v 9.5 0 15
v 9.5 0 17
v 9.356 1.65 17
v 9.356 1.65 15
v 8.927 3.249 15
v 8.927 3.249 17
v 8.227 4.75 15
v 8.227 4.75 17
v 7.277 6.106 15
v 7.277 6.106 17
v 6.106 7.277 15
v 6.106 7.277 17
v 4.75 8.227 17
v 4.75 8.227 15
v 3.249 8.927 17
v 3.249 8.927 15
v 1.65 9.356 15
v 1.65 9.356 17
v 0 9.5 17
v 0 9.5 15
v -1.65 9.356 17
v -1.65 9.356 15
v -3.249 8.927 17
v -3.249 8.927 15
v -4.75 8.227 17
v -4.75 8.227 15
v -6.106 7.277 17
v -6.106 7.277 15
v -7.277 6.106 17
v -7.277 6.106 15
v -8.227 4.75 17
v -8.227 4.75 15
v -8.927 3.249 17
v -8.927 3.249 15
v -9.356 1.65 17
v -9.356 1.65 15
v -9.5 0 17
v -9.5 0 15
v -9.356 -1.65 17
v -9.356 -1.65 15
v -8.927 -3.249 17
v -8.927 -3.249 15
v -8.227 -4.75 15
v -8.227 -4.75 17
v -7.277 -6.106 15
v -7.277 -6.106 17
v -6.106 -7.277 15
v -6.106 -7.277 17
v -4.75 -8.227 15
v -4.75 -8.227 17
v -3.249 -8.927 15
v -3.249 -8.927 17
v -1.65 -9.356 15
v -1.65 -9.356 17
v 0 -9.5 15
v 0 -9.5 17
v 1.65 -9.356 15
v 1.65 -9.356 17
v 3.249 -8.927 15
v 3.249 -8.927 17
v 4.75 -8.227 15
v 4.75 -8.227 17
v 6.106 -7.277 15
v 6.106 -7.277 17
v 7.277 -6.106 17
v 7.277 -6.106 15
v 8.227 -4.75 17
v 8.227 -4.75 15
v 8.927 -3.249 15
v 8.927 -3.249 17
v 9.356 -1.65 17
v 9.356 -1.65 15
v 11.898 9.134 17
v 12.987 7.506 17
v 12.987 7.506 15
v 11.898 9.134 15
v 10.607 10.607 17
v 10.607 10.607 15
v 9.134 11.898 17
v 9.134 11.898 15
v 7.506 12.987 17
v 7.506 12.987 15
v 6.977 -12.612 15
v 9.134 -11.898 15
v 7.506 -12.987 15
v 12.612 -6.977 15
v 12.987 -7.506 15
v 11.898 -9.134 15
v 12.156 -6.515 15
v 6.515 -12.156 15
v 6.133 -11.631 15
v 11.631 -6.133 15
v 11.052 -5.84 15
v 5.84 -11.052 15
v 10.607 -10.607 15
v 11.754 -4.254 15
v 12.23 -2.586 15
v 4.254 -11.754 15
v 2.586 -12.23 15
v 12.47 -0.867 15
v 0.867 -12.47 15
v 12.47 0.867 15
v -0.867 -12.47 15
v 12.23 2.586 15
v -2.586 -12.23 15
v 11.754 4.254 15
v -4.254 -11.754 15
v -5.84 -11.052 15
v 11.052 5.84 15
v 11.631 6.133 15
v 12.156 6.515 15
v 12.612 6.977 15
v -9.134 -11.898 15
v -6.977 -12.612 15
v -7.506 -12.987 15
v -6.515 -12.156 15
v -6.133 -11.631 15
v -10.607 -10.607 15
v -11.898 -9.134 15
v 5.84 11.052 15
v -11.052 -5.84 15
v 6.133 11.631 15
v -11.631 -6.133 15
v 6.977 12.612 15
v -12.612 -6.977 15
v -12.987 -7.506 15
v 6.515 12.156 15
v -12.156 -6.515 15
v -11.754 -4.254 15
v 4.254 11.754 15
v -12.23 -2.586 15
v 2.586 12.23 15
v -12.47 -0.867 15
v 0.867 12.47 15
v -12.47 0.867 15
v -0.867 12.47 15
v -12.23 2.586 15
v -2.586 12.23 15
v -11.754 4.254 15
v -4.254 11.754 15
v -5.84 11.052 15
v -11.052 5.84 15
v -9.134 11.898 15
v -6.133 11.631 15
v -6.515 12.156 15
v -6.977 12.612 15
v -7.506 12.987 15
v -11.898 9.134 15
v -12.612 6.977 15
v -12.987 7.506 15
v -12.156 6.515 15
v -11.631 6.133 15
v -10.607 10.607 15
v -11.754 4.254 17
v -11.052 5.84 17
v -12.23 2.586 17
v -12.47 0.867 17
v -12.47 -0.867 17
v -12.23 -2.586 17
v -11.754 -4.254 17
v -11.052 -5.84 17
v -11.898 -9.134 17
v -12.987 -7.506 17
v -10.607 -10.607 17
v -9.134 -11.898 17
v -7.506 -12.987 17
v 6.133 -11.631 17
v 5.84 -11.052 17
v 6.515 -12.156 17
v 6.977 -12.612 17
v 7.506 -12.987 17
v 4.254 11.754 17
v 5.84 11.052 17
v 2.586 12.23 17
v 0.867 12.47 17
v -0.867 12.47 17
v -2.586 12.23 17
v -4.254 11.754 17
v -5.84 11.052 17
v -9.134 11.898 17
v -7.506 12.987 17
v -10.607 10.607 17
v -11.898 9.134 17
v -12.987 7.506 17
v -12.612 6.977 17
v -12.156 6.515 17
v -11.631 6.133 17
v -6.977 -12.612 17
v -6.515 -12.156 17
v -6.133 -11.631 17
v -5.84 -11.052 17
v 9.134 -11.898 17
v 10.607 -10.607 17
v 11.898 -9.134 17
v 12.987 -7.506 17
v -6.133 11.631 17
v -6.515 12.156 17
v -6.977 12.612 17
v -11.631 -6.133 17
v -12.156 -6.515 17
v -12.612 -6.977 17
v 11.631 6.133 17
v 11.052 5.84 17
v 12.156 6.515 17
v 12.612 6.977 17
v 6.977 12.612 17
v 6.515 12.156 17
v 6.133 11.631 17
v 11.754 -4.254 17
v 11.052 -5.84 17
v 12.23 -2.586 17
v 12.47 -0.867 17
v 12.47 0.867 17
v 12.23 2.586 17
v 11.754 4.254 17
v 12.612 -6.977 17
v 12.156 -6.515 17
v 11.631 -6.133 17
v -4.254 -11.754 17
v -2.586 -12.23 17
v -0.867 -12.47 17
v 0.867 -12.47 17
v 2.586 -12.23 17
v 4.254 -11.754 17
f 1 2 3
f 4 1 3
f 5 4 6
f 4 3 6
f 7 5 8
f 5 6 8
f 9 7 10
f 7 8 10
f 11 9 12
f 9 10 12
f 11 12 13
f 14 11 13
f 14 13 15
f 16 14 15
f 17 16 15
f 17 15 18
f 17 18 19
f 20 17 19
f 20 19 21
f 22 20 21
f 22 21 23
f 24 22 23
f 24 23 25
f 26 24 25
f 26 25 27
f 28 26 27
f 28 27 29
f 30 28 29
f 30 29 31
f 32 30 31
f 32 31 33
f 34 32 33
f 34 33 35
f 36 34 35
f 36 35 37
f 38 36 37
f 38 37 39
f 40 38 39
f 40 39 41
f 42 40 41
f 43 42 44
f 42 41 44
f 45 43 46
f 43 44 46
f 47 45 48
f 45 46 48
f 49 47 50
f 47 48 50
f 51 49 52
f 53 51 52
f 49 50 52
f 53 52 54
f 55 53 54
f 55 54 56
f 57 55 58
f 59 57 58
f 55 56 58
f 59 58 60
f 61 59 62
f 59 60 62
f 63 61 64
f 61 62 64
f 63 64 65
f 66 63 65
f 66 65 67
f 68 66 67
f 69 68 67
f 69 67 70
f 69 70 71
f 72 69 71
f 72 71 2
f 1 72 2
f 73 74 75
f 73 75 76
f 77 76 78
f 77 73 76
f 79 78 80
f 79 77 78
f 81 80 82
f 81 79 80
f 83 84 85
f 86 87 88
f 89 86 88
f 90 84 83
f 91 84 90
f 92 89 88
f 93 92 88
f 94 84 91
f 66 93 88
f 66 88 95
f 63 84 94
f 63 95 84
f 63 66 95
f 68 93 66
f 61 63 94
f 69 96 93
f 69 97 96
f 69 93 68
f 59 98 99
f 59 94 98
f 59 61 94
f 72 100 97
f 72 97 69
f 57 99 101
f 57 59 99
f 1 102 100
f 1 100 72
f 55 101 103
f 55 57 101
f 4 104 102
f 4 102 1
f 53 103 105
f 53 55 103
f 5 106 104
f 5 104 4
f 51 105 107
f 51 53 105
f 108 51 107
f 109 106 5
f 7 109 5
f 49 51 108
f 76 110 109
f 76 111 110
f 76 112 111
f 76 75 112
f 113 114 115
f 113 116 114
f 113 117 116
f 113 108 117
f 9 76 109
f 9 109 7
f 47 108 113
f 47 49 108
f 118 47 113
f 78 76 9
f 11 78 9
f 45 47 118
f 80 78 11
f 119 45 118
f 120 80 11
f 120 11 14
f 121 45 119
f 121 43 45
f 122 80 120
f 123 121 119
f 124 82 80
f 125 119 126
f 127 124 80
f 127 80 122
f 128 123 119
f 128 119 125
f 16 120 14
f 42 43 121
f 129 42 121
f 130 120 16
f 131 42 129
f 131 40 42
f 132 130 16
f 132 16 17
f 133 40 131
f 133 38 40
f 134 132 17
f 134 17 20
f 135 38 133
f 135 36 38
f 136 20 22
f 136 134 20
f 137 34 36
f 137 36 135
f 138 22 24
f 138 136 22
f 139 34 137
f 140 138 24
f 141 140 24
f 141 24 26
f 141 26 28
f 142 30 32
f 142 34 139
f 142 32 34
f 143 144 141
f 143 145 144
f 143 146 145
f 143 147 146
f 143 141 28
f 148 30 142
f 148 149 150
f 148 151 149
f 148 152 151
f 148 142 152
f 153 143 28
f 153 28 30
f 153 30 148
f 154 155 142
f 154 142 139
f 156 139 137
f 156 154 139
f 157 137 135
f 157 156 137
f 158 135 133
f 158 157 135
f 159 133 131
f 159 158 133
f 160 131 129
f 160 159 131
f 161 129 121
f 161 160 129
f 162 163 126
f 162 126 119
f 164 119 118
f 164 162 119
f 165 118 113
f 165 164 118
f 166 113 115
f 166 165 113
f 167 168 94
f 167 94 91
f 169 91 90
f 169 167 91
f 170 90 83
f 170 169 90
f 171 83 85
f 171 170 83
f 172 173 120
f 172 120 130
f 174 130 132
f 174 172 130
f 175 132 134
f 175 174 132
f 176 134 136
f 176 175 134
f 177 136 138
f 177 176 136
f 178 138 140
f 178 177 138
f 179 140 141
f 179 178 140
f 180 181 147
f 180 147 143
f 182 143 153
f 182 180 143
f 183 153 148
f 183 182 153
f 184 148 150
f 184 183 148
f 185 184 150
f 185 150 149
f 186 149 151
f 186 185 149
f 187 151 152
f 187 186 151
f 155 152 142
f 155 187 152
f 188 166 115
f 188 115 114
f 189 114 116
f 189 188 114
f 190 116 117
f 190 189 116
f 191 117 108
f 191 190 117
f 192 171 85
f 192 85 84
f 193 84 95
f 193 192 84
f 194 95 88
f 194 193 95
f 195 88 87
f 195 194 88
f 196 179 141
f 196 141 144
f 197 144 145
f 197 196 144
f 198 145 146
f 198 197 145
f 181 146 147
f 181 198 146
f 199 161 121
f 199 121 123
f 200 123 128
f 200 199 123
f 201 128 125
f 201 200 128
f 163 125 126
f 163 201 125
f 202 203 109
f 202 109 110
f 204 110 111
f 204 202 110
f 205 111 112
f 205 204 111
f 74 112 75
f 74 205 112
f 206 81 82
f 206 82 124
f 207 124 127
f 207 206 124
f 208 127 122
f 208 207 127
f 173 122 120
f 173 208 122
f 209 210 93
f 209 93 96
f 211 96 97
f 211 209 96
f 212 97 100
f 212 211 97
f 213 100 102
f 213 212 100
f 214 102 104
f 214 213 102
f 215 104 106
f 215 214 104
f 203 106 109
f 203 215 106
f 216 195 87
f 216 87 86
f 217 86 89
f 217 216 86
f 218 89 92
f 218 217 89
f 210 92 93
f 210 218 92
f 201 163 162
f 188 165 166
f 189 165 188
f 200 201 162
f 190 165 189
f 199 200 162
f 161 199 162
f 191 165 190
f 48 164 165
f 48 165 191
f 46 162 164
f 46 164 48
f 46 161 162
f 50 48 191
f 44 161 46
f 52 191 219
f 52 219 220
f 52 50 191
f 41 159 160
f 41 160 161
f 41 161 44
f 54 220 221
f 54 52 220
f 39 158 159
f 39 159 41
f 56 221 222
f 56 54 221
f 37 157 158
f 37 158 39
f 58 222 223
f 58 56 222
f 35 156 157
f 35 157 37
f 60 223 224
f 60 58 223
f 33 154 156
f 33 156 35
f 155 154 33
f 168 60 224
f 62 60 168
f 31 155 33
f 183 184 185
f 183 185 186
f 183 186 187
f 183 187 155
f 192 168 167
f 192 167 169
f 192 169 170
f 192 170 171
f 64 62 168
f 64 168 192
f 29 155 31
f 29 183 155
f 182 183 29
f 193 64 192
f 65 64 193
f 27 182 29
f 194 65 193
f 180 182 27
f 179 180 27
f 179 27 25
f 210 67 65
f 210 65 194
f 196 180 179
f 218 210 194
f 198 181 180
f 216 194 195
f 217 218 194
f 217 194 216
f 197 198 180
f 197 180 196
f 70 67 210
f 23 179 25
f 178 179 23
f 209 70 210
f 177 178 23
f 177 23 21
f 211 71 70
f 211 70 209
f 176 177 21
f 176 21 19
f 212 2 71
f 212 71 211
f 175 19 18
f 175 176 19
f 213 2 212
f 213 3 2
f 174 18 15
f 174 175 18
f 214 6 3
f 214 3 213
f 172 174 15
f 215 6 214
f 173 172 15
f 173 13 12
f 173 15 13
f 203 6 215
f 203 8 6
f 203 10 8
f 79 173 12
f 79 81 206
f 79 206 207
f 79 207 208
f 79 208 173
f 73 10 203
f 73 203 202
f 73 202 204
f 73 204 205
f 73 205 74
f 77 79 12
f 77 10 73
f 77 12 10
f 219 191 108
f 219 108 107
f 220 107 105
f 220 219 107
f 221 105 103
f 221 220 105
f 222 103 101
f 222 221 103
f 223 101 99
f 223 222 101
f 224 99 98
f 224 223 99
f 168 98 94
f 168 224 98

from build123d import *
from build123d.topology import SkipClean

# Parameters (mm, degrees)
SKETCH3_R             = 4
BOSS_EXTRUDE1_DEPTH   = 11
BOSS_EXTRUDE1_2_DEPTH = 11
BOSS_EXTRUDE1_3_DEPTH = 11
BOSS_EXTRUDE1_4_DEPTH = 11
BOSS_EXTRUDE6_START   = 2
SKETCH6_R             = 9.5
BOSS_EXTRUDE6_DEPTH   = 2
SKETCH7_R             = 19.191160133
CUT_EXTRUDE1_DEPTH    = 11


with BuildPart() as part:
    # Sketch3 → Boss-Extrude1 (new body)
    with BuildSketch(Plane(origin=(0, 0, 15), x_dir=(-1, 0, 0), z_dir=(0, 0, -1))):
        with Locations((-9.545941546, 9.545941546)):
            Circle(SKETCH3_R)
    extrude(amount=BOSS_EXTRUDE1_DEPTH)



with BuildPart() as body_2:
    # Sketch3 → Boss-Extrude1 2 (new body)
    with BuildSketch(Plane(origin=(0, 0, 15), x_dir=(-1, 0, 0), z_dir=(0, 0, -1))):
        with Locations((9.545941546, 9.545941546)):
            Circle(SKETCH3_R)
    extrude(amount=BOSS_EXTRUDE1_2_DEPTH)


with BuildPart() as body_3:
    # Sketch3 → Boss-Extrude1 3 (new body)
    with BuildSketch(Plane(origin=(0, 0, 15), x_dir=(-1, 0, 0), z_dir=(0, 0, -1))):
        with Locations((9.545941546, -9.545941546)):
            Circle(SKETCH3_R)
    extrude(amount=BOSS_EXTRUDE1_3_DEPTH)


with BuildPart() as body_4:
    # Sketch3 → Boss-Extrude1 4 (new body)
    with BuildSketch(Plane(origin=(0, 0, 15), x_dir=(-1, 0, 0), z_dir=(0, 0, -1))):
        with Locations((-9.545941546, -9.545941546)):
            Circle(SKETCH3_R)
    extrude(amount=BOSS_EXTRUDE1_4_DEPTH)


with BuildPart() as part_1:
    with SkipClean():  # the faces are left unmerged after this step: merging them gives an invalid solid
        add(part.part)

        add(body_2.part)  # Boss-Extrude6 merges body 2

        add(body_3.part)  # Boss-Extrude6 merges body 3

        add(body_4.part)  # Boss-Extrude6 merges body 4
        # Sketch6 → Boss-Extrude6 (add)
        with BuildSketch(Plane.XY.offset(15).offset(BOSS_EXTRUDE6_START)):
            with BuildLine():
                ThreePointArc((-5.840211131, 11.051784197), (-6.514660932, 12.155795534), (-7.506206096, 12.986795988))
                ThreePointArc((-7.506206096, 12.986795988), (-10.606601718, 10.606601718), (-12.986795988, 7.506206096))
                ThreePointArc((-12.986795988, 7.506206096), (-12.155795534, 6.514660932), (-11.051784197, 5.840211131))
                ThreePointArc((-11.051784197, 5.840211131), (-12.5, 0), (-11.051784197, -5.840211131))
                ThreePointArc((-11.051784197, -5.840211131), (-12.155795534, -6.514660932), (-12.986795988, -7.506206096))
                ThreePointArc((-12.986795988, -7.506206096), (-10.606601718, -10.606601718), (-7.506206096, -12.986795988))
                ThreePointArc((-7.506206096, -12.986795988), (-6.514660932, -12.155795534), (-5.840211131, -11.051784197))
                ThreePointArc((-5.840211131, -11.051784197), (0, -12.5), (5.840211131, -11.051784197))
                ThreePointArc((5.840211131, -11.051784197), (6.514660932, -12.155795534), (7.506206096, -12.986795988))
                ThreePointArc((7.506206096, -12.986795988), (10.606601718, -10.606601718), (12.986795988, -7.506206096))
                ThreePointArc((12.986795988, -7.506206096), (12.155795534, -6.514660932), (11.051784197, -5.840211131))
                ThreePointArc((11.051784197, -5.840211131), (12.5, 0), (11.051784197, 5.840211131))
                ThreePointArc((11.051784197, 5.840211131), (12.155795534, 6.514660932), (12.986795988, 7.506206096))
                ThreePointArc((12.986795988, 7.506206096), (10.606601718, 10.606601718), (7.506206096, 12.986795988))
                ThreePointArc((7.506206096, 12.986795988), (6.514660932, 12.155795534), (5.840211131, 11.051784197))
                ThreePointArc((5.840211131, 11.051784197), (0, 12.5), (-5.840211131, 11.051784197))
            make_face()
            Circle(SKETCH6_R, mode=Mode.SUBTRACT)
        extrude(amount=-BOSS_EXTRUDE6_DEPTH)

    # Sketch7 → Cut-Extrude1 (cut)
    with BuildSketch(Plane(origin=(0, 0, 4), x_dir=(-1, 0, 0), z_dir=(0, 0, -1))):
        Circle(SKETCH7_R)
    extrude(amount=-CUT_EXTRUDE1_DEPTH, mode=Mode.SUBTRACT)


solid = part_1.part
